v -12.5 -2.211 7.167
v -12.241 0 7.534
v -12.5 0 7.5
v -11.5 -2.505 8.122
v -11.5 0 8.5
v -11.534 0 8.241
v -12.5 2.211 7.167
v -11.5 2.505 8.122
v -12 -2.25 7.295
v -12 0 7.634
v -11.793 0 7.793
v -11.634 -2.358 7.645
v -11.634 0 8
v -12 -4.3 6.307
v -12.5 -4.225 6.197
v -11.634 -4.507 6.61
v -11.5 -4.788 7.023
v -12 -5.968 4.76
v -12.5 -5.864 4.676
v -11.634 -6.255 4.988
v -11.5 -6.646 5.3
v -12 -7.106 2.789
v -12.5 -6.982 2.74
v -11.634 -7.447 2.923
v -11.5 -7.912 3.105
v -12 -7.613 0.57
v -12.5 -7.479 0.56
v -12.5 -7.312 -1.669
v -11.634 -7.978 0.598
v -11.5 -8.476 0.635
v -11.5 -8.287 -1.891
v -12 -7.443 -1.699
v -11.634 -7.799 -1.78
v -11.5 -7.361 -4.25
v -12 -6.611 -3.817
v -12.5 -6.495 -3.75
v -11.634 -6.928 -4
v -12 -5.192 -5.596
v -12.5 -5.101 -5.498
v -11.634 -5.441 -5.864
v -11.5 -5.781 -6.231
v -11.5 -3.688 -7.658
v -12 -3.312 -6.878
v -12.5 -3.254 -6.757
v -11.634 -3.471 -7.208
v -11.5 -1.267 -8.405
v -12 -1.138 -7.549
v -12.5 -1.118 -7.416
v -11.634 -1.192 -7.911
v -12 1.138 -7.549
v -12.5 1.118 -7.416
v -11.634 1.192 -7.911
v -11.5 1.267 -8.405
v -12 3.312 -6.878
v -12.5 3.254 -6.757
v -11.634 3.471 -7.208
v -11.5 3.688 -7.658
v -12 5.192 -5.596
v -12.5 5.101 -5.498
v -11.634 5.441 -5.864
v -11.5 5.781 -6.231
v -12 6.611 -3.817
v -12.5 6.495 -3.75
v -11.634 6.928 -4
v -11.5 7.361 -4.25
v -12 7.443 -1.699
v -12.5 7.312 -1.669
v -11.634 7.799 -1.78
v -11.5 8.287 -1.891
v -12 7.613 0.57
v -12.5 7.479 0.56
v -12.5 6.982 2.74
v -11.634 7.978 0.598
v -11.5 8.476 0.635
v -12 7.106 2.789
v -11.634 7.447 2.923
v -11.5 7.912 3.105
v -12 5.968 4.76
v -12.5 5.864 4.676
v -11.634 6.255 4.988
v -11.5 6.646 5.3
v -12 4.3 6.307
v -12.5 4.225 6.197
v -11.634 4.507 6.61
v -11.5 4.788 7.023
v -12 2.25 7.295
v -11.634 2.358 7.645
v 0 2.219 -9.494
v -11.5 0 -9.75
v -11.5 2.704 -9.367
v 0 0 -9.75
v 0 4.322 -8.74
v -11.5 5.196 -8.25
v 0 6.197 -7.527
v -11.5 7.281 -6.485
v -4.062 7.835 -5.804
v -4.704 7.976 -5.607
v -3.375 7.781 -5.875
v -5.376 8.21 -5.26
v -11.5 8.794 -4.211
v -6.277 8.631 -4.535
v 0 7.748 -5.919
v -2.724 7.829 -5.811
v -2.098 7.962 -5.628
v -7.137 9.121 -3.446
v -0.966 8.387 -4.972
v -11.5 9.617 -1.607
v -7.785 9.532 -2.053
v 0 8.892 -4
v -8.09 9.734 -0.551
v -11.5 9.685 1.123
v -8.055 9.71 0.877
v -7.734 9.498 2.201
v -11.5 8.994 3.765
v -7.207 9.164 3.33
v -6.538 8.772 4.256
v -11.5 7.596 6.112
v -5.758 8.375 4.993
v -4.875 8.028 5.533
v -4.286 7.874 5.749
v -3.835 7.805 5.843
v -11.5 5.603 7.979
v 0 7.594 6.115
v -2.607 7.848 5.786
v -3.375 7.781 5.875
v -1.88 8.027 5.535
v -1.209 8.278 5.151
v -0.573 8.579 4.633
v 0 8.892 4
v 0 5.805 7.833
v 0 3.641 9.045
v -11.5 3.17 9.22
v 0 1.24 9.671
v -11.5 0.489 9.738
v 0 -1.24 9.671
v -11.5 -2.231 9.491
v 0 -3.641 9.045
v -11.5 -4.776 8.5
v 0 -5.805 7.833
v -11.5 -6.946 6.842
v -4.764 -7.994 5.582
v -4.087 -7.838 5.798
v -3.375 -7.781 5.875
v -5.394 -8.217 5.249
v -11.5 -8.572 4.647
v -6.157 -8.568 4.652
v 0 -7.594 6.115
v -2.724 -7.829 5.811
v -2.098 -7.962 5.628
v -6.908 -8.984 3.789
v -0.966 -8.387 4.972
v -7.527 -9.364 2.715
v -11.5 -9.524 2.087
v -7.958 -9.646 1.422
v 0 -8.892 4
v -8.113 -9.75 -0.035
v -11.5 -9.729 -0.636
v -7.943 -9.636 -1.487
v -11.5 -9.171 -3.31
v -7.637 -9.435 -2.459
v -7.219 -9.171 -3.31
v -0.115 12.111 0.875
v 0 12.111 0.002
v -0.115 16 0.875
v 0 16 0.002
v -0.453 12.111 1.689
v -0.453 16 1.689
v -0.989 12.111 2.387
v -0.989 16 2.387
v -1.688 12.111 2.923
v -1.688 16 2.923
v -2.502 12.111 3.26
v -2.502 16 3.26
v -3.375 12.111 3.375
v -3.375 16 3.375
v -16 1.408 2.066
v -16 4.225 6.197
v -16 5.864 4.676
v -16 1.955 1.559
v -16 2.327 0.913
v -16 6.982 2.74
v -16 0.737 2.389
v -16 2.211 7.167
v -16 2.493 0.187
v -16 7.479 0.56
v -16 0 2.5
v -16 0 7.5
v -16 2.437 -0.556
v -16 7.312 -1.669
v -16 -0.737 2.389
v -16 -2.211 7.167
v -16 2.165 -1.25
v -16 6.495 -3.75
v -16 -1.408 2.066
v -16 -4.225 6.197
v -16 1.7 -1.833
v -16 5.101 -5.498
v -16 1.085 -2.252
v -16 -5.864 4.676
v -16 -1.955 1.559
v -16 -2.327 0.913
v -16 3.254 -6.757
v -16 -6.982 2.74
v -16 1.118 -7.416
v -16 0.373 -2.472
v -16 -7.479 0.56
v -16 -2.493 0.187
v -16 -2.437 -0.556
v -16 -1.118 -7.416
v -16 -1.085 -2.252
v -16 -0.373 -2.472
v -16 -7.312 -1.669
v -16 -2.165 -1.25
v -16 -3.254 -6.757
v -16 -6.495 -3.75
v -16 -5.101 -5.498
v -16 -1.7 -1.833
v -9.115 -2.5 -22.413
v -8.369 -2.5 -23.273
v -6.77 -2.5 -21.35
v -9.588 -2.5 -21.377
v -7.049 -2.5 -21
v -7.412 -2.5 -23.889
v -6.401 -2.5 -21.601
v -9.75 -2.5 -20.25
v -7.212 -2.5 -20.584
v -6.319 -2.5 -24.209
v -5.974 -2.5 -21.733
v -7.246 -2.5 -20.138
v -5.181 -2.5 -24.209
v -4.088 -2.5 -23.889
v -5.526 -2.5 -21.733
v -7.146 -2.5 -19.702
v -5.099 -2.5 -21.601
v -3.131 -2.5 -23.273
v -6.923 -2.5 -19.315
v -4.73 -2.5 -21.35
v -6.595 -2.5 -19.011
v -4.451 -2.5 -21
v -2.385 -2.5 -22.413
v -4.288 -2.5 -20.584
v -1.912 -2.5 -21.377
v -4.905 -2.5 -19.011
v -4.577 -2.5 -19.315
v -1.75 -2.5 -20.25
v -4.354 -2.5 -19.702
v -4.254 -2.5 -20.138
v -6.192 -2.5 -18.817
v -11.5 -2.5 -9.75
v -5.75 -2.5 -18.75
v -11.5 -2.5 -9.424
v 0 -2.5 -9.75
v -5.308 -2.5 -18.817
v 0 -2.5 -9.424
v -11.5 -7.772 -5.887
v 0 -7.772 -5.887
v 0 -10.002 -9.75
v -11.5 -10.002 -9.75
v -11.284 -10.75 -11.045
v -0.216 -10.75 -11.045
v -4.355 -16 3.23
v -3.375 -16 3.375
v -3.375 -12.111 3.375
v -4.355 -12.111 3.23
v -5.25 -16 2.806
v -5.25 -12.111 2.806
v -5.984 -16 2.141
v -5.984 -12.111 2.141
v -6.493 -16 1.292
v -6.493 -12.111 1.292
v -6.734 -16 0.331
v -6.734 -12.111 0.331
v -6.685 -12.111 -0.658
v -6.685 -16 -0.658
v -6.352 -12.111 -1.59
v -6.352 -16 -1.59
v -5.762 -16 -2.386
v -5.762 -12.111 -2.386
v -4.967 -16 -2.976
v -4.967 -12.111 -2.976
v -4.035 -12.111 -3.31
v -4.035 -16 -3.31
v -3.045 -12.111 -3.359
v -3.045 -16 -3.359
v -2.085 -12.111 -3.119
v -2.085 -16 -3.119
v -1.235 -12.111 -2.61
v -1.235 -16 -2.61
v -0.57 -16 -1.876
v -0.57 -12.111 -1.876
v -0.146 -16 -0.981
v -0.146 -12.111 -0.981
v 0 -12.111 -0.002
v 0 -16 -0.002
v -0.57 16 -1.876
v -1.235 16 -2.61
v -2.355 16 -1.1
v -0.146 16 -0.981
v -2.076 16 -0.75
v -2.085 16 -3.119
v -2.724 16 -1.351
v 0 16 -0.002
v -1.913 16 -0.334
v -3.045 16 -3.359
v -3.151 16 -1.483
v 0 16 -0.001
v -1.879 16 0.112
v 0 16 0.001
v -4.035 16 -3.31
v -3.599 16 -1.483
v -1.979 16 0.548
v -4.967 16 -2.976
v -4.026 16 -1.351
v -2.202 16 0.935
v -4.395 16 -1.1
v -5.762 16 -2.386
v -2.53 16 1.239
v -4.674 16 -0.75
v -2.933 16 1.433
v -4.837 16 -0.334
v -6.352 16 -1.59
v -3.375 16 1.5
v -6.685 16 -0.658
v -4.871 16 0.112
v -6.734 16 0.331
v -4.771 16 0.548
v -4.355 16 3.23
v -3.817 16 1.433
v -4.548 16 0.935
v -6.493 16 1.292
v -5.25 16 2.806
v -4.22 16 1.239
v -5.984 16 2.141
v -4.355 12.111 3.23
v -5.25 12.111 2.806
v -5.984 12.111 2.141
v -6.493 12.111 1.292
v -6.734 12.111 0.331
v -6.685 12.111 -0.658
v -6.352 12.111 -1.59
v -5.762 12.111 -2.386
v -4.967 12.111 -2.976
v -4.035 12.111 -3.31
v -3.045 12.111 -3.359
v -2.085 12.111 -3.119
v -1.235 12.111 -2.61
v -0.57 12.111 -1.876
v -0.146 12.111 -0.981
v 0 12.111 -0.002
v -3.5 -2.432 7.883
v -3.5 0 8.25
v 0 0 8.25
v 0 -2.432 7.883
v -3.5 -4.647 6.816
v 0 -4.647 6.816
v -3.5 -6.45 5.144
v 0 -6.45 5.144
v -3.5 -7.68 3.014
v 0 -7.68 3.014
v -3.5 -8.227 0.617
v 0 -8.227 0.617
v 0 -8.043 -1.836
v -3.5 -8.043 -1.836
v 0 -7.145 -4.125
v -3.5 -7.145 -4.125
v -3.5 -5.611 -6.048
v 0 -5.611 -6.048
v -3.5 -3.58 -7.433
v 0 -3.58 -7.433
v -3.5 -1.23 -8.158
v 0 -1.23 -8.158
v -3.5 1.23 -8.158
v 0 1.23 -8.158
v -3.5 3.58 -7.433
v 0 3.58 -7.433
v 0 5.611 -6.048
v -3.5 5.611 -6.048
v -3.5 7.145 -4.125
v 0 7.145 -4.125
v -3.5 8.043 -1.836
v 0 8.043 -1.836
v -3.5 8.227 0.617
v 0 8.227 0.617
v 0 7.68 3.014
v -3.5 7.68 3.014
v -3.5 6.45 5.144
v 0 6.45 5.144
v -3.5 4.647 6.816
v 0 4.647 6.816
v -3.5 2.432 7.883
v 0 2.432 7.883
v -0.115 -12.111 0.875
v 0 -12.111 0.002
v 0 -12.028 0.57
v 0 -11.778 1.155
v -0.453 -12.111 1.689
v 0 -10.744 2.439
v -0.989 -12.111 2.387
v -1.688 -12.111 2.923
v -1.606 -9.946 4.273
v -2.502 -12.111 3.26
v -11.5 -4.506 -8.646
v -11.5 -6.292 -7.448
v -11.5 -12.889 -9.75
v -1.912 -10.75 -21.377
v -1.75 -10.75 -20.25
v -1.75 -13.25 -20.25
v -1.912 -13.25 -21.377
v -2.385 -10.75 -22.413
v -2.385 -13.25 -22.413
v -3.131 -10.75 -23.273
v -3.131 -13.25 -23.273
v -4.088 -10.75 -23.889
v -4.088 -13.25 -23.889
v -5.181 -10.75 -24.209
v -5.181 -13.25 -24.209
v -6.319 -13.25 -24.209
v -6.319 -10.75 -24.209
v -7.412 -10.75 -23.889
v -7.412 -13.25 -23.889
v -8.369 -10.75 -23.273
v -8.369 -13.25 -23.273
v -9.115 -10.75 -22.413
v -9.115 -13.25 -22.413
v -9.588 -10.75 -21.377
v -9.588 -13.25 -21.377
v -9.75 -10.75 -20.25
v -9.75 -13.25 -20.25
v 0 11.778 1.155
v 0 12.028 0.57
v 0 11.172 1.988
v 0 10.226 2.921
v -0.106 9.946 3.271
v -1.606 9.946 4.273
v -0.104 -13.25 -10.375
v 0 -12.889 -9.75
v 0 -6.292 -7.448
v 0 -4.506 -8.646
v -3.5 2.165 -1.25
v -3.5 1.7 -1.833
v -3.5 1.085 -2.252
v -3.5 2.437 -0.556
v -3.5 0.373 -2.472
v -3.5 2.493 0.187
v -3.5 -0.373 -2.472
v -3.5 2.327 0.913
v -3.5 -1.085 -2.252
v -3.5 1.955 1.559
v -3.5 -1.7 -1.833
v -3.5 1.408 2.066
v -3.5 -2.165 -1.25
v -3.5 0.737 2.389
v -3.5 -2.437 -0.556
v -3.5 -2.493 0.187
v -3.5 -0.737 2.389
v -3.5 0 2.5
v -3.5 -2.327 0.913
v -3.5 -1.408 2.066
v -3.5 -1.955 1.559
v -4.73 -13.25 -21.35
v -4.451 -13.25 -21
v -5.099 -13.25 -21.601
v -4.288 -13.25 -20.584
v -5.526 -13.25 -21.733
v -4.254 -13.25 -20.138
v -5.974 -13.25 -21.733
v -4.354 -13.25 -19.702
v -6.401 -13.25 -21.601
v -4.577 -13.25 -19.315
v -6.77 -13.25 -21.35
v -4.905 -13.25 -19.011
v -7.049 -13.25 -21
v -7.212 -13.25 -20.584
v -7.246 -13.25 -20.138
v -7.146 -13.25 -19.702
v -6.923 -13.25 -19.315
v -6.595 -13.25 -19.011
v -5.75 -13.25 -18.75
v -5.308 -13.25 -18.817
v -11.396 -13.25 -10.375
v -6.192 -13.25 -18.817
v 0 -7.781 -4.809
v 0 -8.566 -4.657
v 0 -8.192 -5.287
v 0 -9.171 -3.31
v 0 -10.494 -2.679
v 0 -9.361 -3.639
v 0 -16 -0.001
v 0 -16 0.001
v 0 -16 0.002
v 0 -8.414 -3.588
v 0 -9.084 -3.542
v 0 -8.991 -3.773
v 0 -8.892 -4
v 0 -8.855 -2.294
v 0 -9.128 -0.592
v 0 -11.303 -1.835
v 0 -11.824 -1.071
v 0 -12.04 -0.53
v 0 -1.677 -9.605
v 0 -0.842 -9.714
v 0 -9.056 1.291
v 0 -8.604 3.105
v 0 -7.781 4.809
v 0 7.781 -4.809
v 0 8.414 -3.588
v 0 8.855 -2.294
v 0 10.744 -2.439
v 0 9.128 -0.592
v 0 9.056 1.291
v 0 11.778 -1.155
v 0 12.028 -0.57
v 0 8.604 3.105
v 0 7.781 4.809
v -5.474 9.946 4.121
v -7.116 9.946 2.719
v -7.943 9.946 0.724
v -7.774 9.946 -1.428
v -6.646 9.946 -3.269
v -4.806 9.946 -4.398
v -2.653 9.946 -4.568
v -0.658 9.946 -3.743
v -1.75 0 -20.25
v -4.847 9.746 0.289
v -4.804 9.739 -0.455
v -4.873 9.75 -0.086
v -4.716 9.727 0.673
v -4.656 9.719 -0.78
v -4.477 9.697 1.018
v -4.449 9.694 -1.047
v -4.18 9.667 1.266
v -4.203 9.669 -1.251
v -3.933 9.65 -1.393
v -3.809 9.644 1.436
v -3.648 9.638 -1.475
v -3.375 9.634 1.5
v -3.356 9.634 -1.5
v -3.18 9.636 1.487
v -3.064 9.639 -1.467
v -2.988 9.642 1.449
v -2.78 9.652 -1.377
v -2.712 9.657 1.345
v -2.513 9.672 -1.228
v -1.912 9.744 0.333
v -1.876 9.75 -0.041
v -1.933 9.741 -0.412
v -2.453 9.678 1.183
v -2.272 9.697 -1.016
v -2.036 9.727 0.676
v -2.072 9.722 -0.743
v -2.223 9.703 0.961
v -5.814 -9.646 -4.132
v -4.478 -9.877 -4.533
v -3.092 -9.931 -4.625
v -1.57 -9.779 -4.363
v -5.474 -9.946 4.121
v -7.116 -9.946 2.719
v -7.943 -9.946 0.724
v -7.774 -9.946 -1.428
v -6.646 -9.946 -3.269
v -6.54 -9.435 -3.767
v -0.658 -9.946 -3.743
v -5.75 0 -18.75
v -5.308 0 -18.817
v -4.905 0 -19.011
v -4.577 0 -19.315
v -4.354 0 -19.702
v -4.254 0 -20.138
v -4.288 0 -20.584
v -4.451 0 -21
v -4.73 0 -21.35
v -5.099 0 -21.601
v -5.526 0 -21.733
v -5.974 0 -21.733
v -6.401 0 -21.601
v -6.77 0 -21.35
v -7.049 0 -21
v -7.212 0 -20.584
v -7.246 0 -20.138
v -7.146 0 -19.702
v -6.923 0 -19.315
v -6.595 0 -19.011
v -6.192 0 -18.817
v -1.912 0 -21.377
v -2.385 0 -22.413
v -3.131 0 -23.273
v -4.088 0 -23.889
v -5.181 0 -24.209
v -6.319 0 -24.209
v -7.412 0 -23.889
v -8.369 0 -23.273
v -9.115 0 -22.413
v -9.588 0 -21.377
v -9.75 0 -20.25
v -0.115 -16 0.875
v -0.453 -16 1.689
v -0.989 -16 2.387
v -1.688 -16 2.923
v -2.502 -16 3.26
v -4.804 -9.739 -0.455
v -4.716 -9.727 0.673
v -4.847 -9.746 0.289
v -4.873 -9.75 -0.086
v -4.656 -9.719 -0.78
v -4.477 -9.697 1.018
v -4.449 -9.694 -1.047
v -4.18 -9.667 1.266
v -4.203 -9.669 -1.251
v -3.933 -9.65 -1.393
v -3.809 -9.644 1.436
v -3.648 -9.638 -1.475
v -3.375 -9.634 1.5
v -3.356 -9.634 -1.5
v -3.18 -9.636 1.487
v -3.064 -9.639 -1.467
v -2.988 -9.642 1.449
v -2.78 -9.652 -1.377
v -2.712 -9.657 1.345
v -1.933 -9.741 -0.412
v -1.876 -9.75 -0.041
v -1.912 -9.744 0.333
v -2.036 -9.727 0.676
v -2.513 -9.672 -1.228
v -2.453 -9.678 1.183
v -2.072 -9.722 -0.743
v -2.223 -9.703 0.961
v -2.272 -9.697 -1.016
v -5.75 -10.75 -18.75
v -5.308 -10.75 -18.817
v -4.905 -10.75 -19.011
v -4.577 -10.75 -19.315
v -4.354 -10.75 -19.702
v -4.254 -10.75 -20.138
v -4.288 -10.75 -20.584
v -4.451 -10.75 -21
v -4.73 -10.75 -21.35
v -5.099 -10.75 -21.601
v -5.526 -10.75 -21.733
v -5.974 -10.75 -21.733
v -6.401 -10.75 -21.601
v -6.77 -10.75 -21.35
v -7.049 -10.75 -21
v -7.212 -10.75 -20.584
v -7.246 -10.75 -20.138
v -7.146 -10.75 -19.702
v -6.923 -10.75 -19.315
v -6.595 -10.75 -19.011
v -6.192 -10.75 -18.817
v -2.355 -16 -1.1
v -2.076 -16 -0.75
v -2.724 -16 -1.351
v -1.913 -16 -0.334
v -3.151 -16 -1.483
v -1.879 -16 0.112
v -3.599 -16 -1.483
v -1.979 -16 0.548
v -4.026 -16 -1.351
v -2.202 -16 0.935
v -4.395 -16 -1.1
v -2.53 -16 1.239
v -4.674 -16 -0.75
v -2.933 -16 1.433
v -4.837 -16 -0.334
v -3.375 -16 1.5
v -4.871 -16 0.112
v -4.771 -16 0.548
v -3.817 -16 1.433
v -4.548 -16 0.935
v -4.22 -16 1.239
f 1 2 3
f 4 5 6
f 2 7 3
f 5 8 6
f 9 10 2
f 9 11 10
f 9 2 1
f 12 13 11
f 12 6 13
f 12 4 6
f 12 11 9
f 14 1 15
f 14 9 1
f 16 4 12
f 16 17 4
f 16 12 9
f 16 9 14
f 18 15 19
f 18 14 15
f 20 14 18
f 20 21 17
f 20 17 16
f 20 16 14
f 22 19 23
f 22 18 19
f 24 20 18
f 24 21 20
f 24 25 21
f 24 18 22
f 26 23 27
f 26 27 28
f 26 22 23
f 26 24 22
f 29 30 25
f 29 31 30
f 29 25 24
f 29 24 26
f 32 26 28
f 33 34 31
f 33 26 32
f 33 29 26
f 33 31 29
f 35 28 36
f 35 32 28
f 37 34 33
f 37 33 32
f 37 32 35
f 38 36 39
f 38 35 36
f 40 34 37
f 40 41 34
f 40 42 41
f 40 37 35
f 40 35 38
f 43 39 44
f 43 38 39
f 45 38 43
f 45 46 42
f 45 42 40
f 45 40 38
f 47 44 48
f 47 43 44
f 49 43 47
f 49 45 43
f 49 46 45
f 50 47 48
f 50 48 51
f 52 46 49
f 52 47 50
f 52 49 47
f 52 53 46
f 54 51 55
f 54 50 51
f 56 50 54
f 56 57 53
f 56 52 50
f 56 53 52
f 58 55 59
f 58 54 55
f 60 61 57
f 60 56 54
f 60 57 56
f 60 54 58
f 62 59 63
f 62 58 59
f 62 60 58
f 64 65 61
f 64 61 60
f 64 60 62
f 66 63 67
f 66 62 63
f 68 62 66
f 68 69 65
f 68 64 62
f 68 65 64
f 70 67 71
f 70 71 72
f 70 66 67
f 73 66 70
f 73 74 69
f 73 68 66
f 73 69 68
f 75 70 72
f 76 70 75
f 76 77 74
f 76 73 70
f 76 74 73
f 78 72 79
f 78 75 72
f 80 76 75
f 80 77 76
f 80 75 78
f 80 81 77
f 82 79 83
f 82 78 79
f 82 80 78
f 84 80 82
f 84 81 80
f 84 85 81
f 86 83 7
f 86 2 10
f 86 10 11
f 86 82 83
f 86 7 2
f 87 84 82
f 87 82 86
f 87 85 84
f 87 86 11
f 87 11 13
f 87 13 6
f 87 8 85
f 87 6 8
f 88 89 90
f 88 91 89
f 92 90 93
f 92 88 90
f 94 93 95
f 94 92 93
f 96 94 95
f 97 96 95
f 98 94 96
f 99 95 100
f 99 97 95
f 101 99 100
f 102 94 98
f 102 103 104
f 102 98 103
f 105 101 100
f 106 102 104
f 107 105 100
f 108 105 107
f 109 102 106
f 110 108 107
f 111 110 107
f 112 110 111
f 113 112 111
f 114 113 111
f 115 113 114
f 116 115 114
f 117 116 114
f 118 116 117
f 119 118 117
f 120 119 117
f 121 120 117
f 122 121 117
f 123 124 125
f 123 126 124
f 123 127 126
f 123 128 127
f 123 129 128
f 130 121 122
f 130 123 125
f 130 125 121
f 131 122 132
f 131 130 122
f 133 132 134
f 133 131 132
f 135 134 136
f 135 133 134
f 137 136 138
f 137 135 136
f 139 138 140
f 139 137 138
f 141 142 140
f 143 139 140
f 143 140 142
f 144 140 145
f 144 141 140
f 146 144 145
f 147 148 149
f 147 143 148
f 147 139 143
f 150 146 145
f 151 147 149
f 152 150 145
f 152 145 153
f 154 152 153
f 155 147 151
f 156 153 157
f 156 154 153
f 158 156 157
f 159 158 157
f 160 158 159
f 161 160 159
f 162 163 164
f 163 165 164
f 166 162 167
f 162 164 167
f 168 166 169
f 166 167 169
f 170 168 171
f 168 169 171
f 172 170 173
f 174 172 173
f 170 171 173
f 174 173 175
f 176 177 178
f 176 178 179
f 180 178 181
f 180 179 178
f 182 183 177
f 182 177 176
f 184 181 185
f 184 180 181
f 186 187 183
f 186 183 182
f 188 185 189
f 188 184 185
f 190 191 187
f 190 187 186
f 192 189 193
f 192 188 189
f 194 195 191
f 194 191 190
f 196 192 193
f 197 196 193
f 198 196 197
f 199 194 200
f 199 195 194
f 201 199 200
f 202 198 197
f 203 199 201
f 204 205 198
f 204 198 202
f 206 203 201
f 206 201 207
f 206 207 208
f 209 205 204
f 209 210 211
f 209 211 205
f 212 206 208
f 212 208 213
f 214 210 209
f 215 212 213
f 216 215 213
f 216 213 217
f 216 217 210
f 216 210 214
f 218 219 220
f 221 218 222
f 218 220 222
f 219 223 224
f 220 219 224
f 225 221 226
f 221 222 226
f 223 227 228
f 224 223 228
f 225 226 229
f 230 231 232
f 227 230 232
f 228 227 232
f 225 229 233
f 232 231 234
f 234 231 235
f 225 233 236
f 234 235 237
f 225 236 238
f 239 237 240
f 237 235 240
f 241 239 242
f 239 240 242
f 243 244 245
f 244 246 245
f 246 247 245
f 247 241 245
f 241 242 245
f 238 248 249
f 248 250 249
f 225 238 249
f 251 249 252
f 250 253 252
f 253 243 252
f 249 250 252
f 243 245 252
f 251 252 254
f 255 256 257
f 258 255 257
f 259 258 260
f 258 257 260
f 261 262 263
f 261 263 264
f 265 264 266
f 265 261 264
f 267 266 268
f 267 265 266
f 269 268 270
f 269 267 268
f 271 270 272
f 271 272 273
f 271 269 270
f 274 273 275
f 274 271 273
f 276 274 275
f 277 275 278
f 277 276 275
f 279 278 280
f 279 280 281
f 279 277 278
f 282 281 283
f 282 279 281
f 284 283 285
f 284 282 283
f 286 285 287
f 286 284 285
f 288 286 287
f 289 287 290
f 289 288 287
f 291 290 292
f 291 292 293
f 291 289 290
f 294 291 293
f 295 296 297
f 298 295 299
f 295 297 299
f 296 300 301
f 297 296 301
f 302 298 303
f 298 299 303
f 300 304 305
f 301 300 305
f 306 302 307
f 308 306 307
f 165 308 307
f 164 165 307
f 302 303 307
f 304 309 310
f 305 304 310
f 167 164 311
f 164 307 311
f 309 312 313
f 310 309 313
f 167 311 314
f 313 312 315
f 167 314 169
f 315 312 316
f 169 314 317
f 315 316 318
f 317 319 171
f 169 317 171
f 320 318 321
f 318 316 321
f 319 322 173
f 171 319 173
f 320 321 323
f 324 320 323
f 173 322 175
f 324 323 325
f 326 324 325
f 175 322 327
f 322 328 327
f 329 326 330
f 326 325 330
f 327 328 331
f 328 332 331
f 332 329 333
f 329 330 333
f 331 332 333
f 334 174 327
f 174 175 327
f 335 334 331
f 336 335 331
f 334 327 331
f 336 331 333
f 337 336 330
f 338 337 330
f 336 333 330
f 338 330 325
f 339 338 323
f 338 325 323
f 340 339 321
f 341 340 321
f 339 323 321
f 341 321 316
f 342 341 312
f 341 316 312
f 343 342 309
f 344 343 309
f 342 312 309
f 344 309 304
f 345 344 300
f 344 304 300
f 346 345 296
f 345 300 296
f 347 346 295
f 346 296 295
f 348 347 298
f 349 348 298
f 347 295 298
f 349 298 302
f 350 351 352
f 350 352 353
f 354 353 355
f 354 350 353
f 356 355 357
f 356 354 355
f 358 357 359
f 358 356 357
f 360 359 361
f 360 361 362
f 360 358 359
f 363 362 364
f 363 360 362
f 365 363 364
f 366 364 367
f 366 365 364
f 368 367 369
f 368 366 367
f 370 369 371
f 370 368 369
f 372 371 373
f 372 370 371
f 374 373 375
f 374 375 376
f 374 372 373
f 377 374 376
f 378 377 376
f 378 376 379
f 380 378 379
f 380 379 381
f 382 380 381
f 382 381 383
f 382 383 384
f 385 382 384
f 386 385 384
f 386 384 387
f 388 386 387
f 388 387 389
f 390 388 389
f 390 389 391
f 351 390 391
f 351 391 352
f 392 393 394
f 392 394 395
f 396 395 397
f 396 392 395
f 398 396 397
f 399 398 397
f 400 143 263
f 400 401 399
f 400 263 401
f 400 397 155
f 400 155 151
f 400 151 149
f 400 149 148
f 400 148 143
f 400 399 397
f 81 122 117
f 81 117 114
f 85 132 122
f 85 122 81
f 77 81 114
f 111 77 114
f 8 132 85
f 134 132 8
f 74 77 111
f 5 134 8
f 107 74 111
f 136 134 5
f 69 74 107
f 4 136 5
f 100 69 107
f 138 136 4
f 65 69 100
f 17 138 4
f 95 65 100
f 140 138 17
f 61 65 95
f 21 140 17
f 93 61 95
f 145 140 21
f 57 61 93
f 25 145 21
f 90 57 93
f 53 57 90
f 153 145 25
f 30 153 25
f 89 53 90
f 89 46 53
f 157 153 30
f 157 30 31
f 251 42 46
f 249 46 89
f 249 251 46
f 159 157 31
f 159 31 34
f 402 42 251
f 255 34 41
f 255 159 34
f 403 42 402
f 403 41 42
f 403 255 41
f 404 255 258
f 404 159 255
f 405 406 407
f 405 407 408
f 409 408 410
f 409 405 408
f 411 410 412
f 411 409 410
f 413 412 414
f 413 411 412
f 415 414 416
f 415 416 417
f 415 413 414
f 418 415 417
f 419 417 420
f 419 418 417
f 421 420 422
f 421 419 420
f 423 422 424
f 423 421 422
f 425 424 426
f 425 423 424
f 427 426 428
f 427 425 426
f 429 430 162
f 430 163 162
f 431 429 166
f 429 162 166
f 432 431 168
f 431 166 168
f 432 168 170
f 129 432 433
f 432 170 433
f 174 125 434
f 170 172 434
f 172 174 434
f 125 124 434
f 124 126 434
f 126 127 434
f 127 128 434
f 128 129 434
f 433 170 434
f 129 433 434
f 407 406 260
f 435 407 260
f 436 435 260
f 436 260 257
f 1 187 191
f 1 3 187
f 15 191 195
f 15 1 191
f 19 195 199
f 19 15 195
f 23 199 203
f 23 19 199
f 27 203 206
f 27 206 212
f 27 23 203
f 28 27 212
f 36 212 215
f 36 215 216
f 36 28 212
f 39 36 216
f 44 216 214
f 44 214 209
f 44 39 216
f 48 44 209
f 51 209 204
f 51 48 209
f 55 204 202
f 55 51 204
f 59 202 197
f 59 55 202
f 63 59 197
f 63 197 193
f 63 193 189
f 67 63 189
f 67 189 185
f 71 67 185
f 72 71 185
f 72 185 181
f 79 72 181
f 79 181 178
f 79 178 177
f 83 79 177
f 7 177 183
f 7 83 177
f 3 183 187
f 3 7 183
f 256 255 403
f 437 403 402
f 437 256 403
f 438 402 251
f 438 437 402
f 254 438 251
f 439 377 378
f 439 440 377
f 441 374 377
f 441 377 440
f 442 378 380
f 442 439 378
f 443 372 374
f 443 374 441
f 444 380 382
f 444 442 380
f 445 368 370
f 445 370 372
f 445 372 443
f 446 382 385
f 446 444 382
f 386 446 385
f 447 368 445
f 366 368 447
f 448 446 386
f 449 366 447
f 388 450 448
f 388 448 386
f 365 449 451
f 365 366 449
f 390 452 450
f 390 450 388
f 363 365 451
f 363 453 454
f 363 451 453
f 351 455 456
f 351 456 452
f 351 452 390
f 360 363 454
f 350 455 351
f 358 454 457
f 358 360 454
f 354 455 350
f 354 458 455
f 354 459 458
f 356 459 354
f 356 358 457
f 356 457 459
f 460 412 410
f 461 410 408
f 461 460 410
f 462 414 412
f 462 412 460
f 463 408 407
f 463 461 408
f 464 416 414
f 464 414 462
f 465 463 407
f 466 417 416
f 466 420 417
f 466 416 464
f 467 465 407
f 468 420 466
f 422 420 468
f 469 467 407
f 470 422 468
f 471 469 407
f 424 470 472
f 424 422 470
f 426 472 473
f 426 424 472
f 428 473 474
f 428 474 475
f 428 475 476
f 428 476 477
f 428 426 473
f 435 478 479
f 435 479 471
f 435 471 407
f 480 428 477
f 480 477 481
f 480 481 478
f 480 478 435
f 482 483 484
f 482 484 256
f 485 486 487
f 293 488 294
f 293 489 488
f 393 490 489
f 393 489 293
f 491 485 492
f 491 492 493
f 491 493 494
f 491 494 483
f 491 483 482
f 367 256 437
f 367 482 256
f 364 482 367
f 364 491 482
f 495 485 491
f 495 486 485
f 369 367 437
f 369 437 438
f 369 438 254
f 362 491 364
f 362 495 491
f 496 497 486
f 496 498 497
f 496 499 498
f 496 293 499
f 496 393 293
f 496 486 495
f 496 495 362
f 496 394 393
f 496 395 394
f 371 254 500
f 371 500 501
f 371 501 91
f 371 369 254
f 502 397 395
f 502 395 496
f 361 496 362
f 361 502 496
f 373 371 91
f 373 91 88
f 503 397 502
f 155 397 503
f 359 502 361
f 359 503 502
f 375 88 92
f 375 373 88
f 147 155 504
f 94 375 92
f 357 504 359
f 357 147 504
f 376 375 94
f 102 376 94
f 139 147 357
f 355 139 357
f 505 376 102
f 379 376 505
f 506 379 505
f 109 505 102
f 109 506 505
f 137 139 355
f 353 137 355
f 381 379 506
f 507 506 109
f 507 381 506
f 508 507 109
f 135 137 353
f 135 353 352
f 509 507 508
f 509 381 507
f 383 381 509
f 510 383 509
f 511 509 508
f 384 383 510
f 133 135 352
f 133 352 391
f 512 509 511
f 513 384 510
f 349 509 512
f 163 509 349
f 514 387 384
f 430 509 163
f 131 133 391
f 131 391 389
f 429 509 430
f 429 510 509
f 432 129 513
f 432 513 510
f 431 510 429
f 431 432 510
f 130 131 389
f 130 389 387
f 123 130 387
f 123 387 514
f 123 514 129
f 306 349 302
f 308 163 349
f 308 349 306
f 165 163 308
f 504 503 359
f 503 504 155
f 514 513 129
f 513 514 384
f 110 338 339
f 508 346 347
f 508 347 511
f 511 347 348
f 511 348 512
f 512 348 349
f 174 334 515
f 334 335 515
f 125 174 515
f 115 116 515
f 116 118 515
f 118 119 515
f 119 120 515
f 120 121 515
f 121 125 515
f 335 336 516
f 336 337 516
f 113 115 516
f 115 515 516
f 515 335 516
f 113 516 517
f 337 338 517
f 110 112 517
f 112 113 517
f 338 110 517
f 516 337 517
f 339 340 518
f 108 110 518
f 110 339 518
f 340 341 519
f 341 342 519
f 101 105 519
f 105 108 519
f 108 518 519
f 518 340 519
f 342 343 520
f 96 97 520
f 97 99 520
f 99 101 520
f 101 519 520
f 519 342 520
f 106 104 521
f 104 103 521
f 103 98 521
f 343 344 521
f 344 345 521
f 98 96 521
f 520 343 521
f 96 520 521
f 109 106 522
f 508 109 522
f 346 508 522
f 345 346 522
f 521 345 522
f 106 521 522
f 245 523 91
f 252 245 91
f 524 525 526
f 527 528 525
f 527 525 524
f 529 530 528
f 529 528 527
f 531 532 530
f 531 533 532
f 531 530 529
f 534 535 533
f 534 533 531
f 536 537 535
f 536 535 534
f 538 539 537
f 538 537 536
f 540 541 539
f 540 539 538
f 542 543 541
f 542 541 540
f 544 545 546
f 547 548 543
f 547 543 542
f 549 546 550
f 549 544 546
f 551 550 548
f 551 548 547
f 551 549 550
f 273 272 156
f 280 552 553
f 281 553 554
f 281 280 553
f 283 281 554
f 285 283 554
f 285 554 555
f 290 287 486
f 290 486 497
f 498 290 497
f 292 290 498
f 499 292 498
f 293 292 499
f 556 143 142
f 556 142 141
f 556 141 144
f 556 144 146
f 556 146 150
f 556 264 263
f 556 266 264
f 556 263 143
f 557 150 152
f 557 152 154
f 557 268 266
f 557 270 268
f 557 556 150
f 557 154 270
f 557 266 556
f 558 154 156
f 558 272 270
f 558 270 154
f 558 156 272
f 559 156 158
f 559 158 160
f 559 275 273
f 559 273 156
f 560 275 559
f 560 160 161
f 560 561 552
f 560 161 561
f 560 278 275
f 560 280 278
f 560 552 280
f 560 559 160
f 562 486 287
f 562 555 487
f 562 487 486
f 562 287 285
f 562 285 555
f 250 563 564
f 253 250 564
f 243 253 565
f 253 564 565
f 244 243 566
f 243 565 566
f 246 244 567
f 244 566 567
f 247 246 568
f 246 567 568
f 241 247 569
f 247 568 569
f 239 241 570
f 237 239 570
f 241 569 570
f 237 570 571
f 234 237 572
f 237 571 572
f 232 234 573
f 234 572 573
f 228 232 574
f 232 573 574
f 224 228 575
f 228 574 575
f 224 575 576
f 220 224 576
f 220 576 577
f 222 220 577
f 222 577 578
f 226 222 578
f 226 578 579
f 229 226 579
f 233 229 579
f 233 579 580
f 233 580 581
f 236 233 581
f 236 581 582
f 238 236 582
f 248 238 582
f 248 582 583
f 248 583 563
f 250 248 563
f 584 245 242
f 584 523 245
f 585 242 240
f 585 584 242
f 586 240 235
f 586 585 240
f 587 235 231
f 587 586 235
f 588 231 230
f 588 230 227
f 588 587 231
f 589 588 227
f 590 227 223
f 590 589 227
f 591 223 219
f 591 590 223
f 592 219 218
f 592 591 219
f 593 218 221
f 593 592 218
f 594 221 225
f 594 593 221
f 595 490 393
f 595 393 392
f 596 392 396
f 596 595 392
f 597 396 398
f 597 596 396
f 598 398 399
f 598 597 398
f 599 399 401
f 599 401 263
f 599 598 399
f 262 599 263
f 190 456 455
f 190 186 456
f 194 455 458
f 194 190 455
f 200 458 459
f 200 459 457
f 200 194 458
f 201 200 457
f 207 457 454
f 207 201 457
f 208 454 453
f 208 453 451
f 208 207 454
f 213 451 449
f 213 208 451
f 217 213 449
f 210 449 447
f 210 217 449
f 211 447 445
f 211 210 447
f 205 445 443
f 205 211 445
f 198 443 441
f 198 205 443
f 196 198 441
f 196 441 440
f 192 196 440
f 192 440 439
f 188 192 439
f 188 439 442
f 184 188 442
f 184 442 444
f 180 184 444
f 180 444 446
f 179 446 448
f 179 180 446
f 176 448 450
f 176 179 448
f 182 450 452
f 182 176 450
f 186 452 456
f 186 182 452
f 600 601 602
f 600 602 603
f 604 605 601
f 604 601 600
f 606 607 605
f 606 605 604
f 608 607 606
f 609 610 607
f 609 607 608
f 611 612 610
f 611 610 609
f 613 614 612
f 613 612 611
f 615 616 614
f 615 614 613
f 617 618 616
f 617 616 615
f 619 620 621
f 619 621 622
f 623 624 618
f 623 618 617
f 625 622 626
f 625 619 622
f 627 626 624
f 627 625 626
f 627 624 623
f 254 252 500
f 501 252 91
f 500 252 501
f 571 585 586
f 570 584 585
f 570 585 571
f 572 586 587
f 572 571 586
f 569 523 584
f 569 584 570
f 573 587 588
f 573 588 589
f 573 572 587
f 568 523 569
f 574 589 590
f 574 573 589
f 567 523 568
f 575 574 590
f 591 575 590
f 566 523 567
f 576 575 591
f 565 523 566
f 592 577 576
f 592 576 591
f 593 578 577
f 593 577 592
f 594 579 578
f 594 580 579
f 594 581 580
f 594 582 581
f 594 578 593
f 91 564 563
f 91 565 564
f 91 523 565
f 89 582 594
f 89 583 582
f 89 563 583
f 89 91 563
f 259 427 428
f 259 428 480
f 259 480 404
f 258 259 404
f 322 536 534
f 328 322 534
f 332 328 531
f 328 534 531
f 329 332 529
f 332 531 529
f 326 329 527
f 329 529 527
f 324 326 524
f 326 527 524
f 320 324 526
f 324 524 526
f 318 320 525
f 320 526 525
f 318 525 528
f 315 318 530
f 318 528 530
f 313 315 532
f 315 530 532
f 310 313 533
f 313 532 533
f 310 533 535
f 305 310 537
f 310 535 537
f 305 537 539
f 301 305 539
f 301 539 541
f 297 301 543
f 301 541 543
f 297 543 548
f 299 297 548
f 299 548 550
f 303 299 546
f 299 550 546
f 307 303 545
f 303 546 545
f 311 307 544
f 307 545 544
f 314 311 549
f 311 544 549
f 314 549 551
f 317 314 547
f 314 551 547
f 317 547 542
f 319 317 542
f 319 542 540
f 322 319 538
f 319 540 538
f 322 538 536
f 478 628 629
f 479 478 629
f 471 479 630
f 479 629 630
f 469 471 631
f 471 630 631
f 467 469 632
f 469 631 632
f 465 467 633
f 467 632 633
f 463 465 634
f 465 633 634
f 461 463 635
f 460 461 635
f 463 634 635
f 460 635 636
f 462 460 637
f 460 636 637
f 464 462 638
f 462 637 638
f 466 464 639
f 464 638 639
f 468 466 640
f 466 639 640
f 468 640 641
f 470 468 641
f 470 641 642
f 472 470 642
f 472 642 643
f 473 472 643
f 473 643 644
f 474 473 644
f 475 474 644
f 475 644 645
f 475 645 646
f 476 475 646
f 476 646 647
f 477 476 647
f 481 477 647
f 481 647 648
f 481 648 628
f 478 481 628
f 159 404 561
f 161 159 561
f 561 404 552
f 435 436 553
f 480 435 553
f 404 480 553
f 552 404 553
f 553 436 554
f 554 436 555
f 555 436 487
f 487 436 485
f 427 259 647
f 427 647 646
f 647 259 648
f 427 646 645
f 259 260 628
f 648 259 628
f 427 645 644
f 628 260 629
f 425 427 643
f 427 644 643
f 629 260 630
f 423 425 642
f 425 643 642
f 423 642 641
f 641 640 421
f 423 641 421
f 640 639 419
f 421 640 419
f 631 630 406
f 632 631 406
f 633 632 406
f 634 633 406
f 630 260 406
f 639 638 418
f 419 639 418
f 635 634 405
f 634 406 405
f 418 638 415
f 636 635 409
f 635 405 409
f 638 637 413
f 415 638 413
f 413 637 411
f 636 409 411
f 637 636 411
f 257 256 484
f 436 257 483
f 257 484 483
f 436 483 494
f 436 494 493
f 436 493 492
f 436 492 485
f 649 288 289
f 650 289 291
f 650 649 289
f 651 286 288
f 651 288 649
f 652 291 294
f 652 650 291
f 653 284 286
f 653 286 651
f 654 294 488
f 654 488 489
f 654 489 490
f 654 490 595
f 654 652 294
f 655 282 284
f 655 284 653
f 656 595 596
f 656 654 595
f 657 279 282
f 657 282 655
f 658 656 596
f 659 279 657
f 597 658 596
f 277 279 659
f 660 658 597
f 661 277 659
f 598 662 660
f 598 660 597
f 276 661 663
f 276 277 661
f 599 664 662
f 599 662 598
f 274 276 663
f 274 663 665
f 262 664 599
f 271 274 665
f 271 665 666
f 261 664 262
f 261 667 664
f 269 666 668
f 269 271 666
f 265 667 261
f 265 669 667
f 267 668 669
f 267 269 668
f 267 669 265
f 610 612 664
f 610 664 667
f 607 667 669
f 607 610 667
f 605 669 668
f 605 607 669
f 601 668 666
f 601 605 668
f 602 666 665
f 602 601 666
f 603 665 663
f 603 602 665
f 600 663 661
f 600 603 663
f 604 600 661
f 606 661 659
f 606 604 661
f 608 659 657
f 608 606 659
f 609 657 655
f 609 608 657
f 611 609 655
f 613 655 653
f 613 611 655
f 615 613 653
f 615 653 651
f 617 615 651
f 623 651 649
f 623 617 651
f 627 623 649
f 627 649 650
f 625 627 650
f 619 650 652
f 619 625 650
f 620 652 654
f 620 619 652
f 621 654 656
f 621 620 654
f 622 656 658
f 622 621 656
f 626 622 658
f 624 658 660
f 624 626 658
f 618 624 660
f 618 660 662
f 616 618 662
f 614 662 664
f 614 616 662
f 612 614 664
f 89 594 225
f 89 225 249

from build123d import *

# Parameters (mm, degrees)
SKETCH3_W           = 7.302665
SKETCH3_H           = 36.305572
FACE_CUT_DEPTH      = 10
LINK_ARMS_REACH     = 26.639
ROUNDED_LINKS_REACH = 32.365
SKETCH6_R           = 4
TRIM_1_REACH        = 35.167
SKETCH7_R           = 1.5
SKETCH8_W           = 8
SKETCH8_H           = 8.25
TRIM_2_DEPTH        = 15


with BuildPart() as part:
    # Sketch1 → Base Cylinder (revolve)
    with BuildSketch(Plane.XY, mode=Mode.PRIVATE) as base_cylinder_sk:
        with BuildLine():
            Line((-16, 2.5), (-16, 7.5))
            Line((-16, 7.5), (-12.5, 7.5))
            ThreePointArc((-12.5, 7.5), (-11.792893, 7.792893), (-11.5, 8.5))
            Line((-11.5, 8.5), (-11.5, 9.75))
            Line((-11.5, 9.75), (0, 9.75))
            Line((0, 9.75), (0, 8.25))
            Line((0, 8.25), (-3.5, 8.25))
            Line((-3.5, 8.25), (-3.5, 2.5))
            Line((-3.5, 2.5), (-16, 2.5))
        make_face()
    revolve(base_cylinder_sk.sketch.rotate(Axis((-29.02439, 0, 0), (1, 0, 0)), 90), axis=Axis((-29.02439, 0, 0), (1, 0, 0)))

    # Sketch2 → Suspension attachments (revolve)
    with BuildSketch(Plane(origin=(-3.375, 0, 0), x_dir=(0, 0, -1), z_dir=(1, 0, 0))):
        with BuildLine():
            Line((-3.375, 16), (-1.5, 16))
            Line((-1.5, 16), (-1.5, 9.633924))
            ThreePointArc((-1.5, 9.633924), (-3.80208, 8.978123), (-5.875, 7.781187))
            Line((-5.875, 7.781187), (-3.375, 12.111314))
            Line((-3.375, 12.111314), (-3.375, 16))
        make_face()
    suspension_attachments = revolve(axis=Axis((-3.375, 16.888615, 0), (0, -1, 0)))

    # Mirror1: Suspension attachments across plane
    add(suspension_attachments.mirror(Plane.ZX))

    # Sketch3 → Face Cut (cut, symmetric)
    with BuildSketch(Plane.XY):
        with Locations((3.651332, -0.216492)):
            Rectangle(SKETCH3_W, SKETCH3_H)
    extrude(amount=FACE_CUT_DEPTH, both=True, mode=Mode.SUBTRACT)

    # Link Arms: up to this face of the body (flat: up to its plane)
    link_arms_end = Plane(part.part.faces().sort_by_distance((-11.5, 0, -8.775772))[0])
    # Sketch5 → Link Arms (add, up to the picked face)
    with BuildSketch(Plane(origin=(0, 0, 0), x_dir=(0, 0, -1), z_dir=(1, 0, 0)), mode=Mode.PRIVATE) as link_arms_sk1:
        with BuildLine():
            Line((9.75, 0), (20.25, 0))
            Line((20.25, 0), (20.25, -2.5))
            Line((20.25, -2.5), (9.424038, -2.5))
            ThreePointArc((9.424038, -2.5), (9.668166, -1.26058), (9.75, 0))
        make_face()
    link_arms_tool1 = split(extrude(link_arms_sk1.sketch, amount=-LINK_ARMS_REACH, mode=Mode.PRIVATE), bisect_by=link_arms_end, keep=Keep.BOTH, mode=Mode.PRIVATE)
    # Sketch5 → Link Arms (add, up to the picked face)
    with BuildSketch(Plane(origin=(0, 0, 0), x_dir=(0, 0, -1), z_dir=(1, 0, 0)), mode=Mode.PRIVATE) as link_arms_sk2:
        with BuildLine():
            Line((5.887009, -7.772106), (11.044873, -10.75))
            Line((11.044873, -10.75), (20.25, -10.75))
            Line((20.25, -10.75), (20.25, -13.25))
            Line((20.25, -13.25), (10.375, -13.25))
            Line((10.375, -13.25), (3.309929, -9.17098))
            ThreePointArc((3.309929, -9.17098), (4.651358, -8.568977), (5.887009, -7.772106))
        make_face()
    link_arms_tool2 = split(extrude(link_arms_sk2.sketch, amount=-LINK_ARMS_REACH, mode=Mode.PRIVATE), bisect_by=link_arms_end, keep=Keep.BOTH, mode=Mode.PRIVATE)
    add(link_arms_tool1.solids().sort_by(Axis((0, -1.25638, -14.945599), (-1, 0, 0)))[0])
    add(link_arms_tool2.solids().sort_by(Axis((0, -11.294384, -12.172928), (-1, 0, 0)))[0])

    # Rounded Links: up to this face of the body (flat: up to its plane)
    rounded_links_end = Plane(part.part.faces().sort_by_distance((-5.75, -13.25, -15.3125))[0])
    # Sketch6 → Rounded Links (add, up to the picked face)
    with BuildSketch(Plane(origin=(0, 0, 0), x_dir=(1, 0, 0), z_dir=(0, 1, 0)), mode=Mode.PRIVATE) as rounded_links_sk1:
        with Locations(Location((-5.75, 20.25, 0), (0, 0, 180))):
            Circle(SKETCH6_R)
    rounded_links_tool1 = split(extrude(rounded_links_sk1.sketch, amount=-ROUNDED_LINKS_REACH, mode=Mode.PRIVATE), bisect_by=rounded_links_end, keep=Keep.BOTH, mode=Mode.PRIVATE)
    add(rounded_links_tool1.solids().sort_by(Axis((-5.75, 0, -20.25), (0, -1, 0)))[0])

    # Trim 1: up to this face of the body (flat: up to its plane)
    trim_1_end = Plane(part.part.faces().sort_by_distance((-5.75, -13.25, -16.514845))[0])
    # Sketch7 → Trim 1 (cut, up to the picked face)
    with BuildSketch(Plane(origin=(0, 0, 0), x_dir=(1, 0, 0), z_dir=(0, 1, 0)), mode=Mode.PRIVATE) as trim_1_sk1:
        with Locations(Location((-5.75, 20.25, 0), (0, 0, 270))):
            Circle(SKETCH7_R)
    trim_1_tool1 = split(extrude(trim_1_sk1.sketch, amount=-TRIM_1_REACH, mode=Mode.PRIVATE), bisect_by=trim_1_end, keep=Keep.BOTH, mode=Mode.PRIVATE)
    # Sketch7 → Trim 1 (cut, up to the picked face)
    with BuildSketch(Plane(origin=(0, 0, 0), x_dir=(1, 0, 0), z_dir=(0, 1, 0)), mode=Mode.PRIVATE) as trim_1_sk2:
        Polygon((-9.75, 20.25), (-11.5, 9.75), (-11.5, 20.25), align=None)
    trim_1_tool2 = split(extrude(trim_1_sk2.sketch, amount=-TRIM_1_REACH, mode=Mode.PRIVATE), bisect_by=trim_1_end, keep=Keep.BOTH, mode=Mode.PRIVATE)
    # Sketch7 → Trim 1 (cut, up to the picked face)
    with BuildSketch(Plane(origin=(0, 0, 0), x_dir=(1, 0, 0), z_dir=(0, 1, 0)), mode=Mode.PRIVATE) as trim_1_sk3:
        Polygon((-1.75, 20.25), (0, 9.75), (0, 20.25), align=None)
    trim_1_tool3 = split(extrude(trim_1_sk3.sketch, amount=-TRIM_1_REACH, mode=Mode.PRIVATE), bisect_by=trim_1_end, keep=Keep.BOTH, mode=Mode.PRIVATE)
    add(trim_1_tool1.solids().sort_by(Axis((-5.75, 0, -20.25), (0, -1, 0)))[0], mode=Mode.SUBTRACT)
    add(trim_1_tool2.solids().sort_by(Axis((-10.916667, 0, -16.75), (0, -1, 0)))[0], mode=Mode.SUBTRACT)
    add(trim_1_tool3.solids().sort_by(Axis((-0.583333, 0, -16.75), (0, -1, 0)))[0], mode=Mode.SUBTRACT)

    # Sketch8 → Trim 2 (cut, symmetric)
    with BuildSketch(Plane(origin=(1.581081, 0, -0.263514), x_dir=(-0.1643989873053571, 0, -0.9863939238321439), z_dir=(0.9863939238321439, 0, -0.1643989873053571))):
        with Locations((20.919771, -6.625)):
            Rectangle(SKETCH8_W, SKETCH8_H)
    extrude(amount=TRIM_2_DEPTH, both=True, mode=Mode.SUBTRACT)


solid = part.part
